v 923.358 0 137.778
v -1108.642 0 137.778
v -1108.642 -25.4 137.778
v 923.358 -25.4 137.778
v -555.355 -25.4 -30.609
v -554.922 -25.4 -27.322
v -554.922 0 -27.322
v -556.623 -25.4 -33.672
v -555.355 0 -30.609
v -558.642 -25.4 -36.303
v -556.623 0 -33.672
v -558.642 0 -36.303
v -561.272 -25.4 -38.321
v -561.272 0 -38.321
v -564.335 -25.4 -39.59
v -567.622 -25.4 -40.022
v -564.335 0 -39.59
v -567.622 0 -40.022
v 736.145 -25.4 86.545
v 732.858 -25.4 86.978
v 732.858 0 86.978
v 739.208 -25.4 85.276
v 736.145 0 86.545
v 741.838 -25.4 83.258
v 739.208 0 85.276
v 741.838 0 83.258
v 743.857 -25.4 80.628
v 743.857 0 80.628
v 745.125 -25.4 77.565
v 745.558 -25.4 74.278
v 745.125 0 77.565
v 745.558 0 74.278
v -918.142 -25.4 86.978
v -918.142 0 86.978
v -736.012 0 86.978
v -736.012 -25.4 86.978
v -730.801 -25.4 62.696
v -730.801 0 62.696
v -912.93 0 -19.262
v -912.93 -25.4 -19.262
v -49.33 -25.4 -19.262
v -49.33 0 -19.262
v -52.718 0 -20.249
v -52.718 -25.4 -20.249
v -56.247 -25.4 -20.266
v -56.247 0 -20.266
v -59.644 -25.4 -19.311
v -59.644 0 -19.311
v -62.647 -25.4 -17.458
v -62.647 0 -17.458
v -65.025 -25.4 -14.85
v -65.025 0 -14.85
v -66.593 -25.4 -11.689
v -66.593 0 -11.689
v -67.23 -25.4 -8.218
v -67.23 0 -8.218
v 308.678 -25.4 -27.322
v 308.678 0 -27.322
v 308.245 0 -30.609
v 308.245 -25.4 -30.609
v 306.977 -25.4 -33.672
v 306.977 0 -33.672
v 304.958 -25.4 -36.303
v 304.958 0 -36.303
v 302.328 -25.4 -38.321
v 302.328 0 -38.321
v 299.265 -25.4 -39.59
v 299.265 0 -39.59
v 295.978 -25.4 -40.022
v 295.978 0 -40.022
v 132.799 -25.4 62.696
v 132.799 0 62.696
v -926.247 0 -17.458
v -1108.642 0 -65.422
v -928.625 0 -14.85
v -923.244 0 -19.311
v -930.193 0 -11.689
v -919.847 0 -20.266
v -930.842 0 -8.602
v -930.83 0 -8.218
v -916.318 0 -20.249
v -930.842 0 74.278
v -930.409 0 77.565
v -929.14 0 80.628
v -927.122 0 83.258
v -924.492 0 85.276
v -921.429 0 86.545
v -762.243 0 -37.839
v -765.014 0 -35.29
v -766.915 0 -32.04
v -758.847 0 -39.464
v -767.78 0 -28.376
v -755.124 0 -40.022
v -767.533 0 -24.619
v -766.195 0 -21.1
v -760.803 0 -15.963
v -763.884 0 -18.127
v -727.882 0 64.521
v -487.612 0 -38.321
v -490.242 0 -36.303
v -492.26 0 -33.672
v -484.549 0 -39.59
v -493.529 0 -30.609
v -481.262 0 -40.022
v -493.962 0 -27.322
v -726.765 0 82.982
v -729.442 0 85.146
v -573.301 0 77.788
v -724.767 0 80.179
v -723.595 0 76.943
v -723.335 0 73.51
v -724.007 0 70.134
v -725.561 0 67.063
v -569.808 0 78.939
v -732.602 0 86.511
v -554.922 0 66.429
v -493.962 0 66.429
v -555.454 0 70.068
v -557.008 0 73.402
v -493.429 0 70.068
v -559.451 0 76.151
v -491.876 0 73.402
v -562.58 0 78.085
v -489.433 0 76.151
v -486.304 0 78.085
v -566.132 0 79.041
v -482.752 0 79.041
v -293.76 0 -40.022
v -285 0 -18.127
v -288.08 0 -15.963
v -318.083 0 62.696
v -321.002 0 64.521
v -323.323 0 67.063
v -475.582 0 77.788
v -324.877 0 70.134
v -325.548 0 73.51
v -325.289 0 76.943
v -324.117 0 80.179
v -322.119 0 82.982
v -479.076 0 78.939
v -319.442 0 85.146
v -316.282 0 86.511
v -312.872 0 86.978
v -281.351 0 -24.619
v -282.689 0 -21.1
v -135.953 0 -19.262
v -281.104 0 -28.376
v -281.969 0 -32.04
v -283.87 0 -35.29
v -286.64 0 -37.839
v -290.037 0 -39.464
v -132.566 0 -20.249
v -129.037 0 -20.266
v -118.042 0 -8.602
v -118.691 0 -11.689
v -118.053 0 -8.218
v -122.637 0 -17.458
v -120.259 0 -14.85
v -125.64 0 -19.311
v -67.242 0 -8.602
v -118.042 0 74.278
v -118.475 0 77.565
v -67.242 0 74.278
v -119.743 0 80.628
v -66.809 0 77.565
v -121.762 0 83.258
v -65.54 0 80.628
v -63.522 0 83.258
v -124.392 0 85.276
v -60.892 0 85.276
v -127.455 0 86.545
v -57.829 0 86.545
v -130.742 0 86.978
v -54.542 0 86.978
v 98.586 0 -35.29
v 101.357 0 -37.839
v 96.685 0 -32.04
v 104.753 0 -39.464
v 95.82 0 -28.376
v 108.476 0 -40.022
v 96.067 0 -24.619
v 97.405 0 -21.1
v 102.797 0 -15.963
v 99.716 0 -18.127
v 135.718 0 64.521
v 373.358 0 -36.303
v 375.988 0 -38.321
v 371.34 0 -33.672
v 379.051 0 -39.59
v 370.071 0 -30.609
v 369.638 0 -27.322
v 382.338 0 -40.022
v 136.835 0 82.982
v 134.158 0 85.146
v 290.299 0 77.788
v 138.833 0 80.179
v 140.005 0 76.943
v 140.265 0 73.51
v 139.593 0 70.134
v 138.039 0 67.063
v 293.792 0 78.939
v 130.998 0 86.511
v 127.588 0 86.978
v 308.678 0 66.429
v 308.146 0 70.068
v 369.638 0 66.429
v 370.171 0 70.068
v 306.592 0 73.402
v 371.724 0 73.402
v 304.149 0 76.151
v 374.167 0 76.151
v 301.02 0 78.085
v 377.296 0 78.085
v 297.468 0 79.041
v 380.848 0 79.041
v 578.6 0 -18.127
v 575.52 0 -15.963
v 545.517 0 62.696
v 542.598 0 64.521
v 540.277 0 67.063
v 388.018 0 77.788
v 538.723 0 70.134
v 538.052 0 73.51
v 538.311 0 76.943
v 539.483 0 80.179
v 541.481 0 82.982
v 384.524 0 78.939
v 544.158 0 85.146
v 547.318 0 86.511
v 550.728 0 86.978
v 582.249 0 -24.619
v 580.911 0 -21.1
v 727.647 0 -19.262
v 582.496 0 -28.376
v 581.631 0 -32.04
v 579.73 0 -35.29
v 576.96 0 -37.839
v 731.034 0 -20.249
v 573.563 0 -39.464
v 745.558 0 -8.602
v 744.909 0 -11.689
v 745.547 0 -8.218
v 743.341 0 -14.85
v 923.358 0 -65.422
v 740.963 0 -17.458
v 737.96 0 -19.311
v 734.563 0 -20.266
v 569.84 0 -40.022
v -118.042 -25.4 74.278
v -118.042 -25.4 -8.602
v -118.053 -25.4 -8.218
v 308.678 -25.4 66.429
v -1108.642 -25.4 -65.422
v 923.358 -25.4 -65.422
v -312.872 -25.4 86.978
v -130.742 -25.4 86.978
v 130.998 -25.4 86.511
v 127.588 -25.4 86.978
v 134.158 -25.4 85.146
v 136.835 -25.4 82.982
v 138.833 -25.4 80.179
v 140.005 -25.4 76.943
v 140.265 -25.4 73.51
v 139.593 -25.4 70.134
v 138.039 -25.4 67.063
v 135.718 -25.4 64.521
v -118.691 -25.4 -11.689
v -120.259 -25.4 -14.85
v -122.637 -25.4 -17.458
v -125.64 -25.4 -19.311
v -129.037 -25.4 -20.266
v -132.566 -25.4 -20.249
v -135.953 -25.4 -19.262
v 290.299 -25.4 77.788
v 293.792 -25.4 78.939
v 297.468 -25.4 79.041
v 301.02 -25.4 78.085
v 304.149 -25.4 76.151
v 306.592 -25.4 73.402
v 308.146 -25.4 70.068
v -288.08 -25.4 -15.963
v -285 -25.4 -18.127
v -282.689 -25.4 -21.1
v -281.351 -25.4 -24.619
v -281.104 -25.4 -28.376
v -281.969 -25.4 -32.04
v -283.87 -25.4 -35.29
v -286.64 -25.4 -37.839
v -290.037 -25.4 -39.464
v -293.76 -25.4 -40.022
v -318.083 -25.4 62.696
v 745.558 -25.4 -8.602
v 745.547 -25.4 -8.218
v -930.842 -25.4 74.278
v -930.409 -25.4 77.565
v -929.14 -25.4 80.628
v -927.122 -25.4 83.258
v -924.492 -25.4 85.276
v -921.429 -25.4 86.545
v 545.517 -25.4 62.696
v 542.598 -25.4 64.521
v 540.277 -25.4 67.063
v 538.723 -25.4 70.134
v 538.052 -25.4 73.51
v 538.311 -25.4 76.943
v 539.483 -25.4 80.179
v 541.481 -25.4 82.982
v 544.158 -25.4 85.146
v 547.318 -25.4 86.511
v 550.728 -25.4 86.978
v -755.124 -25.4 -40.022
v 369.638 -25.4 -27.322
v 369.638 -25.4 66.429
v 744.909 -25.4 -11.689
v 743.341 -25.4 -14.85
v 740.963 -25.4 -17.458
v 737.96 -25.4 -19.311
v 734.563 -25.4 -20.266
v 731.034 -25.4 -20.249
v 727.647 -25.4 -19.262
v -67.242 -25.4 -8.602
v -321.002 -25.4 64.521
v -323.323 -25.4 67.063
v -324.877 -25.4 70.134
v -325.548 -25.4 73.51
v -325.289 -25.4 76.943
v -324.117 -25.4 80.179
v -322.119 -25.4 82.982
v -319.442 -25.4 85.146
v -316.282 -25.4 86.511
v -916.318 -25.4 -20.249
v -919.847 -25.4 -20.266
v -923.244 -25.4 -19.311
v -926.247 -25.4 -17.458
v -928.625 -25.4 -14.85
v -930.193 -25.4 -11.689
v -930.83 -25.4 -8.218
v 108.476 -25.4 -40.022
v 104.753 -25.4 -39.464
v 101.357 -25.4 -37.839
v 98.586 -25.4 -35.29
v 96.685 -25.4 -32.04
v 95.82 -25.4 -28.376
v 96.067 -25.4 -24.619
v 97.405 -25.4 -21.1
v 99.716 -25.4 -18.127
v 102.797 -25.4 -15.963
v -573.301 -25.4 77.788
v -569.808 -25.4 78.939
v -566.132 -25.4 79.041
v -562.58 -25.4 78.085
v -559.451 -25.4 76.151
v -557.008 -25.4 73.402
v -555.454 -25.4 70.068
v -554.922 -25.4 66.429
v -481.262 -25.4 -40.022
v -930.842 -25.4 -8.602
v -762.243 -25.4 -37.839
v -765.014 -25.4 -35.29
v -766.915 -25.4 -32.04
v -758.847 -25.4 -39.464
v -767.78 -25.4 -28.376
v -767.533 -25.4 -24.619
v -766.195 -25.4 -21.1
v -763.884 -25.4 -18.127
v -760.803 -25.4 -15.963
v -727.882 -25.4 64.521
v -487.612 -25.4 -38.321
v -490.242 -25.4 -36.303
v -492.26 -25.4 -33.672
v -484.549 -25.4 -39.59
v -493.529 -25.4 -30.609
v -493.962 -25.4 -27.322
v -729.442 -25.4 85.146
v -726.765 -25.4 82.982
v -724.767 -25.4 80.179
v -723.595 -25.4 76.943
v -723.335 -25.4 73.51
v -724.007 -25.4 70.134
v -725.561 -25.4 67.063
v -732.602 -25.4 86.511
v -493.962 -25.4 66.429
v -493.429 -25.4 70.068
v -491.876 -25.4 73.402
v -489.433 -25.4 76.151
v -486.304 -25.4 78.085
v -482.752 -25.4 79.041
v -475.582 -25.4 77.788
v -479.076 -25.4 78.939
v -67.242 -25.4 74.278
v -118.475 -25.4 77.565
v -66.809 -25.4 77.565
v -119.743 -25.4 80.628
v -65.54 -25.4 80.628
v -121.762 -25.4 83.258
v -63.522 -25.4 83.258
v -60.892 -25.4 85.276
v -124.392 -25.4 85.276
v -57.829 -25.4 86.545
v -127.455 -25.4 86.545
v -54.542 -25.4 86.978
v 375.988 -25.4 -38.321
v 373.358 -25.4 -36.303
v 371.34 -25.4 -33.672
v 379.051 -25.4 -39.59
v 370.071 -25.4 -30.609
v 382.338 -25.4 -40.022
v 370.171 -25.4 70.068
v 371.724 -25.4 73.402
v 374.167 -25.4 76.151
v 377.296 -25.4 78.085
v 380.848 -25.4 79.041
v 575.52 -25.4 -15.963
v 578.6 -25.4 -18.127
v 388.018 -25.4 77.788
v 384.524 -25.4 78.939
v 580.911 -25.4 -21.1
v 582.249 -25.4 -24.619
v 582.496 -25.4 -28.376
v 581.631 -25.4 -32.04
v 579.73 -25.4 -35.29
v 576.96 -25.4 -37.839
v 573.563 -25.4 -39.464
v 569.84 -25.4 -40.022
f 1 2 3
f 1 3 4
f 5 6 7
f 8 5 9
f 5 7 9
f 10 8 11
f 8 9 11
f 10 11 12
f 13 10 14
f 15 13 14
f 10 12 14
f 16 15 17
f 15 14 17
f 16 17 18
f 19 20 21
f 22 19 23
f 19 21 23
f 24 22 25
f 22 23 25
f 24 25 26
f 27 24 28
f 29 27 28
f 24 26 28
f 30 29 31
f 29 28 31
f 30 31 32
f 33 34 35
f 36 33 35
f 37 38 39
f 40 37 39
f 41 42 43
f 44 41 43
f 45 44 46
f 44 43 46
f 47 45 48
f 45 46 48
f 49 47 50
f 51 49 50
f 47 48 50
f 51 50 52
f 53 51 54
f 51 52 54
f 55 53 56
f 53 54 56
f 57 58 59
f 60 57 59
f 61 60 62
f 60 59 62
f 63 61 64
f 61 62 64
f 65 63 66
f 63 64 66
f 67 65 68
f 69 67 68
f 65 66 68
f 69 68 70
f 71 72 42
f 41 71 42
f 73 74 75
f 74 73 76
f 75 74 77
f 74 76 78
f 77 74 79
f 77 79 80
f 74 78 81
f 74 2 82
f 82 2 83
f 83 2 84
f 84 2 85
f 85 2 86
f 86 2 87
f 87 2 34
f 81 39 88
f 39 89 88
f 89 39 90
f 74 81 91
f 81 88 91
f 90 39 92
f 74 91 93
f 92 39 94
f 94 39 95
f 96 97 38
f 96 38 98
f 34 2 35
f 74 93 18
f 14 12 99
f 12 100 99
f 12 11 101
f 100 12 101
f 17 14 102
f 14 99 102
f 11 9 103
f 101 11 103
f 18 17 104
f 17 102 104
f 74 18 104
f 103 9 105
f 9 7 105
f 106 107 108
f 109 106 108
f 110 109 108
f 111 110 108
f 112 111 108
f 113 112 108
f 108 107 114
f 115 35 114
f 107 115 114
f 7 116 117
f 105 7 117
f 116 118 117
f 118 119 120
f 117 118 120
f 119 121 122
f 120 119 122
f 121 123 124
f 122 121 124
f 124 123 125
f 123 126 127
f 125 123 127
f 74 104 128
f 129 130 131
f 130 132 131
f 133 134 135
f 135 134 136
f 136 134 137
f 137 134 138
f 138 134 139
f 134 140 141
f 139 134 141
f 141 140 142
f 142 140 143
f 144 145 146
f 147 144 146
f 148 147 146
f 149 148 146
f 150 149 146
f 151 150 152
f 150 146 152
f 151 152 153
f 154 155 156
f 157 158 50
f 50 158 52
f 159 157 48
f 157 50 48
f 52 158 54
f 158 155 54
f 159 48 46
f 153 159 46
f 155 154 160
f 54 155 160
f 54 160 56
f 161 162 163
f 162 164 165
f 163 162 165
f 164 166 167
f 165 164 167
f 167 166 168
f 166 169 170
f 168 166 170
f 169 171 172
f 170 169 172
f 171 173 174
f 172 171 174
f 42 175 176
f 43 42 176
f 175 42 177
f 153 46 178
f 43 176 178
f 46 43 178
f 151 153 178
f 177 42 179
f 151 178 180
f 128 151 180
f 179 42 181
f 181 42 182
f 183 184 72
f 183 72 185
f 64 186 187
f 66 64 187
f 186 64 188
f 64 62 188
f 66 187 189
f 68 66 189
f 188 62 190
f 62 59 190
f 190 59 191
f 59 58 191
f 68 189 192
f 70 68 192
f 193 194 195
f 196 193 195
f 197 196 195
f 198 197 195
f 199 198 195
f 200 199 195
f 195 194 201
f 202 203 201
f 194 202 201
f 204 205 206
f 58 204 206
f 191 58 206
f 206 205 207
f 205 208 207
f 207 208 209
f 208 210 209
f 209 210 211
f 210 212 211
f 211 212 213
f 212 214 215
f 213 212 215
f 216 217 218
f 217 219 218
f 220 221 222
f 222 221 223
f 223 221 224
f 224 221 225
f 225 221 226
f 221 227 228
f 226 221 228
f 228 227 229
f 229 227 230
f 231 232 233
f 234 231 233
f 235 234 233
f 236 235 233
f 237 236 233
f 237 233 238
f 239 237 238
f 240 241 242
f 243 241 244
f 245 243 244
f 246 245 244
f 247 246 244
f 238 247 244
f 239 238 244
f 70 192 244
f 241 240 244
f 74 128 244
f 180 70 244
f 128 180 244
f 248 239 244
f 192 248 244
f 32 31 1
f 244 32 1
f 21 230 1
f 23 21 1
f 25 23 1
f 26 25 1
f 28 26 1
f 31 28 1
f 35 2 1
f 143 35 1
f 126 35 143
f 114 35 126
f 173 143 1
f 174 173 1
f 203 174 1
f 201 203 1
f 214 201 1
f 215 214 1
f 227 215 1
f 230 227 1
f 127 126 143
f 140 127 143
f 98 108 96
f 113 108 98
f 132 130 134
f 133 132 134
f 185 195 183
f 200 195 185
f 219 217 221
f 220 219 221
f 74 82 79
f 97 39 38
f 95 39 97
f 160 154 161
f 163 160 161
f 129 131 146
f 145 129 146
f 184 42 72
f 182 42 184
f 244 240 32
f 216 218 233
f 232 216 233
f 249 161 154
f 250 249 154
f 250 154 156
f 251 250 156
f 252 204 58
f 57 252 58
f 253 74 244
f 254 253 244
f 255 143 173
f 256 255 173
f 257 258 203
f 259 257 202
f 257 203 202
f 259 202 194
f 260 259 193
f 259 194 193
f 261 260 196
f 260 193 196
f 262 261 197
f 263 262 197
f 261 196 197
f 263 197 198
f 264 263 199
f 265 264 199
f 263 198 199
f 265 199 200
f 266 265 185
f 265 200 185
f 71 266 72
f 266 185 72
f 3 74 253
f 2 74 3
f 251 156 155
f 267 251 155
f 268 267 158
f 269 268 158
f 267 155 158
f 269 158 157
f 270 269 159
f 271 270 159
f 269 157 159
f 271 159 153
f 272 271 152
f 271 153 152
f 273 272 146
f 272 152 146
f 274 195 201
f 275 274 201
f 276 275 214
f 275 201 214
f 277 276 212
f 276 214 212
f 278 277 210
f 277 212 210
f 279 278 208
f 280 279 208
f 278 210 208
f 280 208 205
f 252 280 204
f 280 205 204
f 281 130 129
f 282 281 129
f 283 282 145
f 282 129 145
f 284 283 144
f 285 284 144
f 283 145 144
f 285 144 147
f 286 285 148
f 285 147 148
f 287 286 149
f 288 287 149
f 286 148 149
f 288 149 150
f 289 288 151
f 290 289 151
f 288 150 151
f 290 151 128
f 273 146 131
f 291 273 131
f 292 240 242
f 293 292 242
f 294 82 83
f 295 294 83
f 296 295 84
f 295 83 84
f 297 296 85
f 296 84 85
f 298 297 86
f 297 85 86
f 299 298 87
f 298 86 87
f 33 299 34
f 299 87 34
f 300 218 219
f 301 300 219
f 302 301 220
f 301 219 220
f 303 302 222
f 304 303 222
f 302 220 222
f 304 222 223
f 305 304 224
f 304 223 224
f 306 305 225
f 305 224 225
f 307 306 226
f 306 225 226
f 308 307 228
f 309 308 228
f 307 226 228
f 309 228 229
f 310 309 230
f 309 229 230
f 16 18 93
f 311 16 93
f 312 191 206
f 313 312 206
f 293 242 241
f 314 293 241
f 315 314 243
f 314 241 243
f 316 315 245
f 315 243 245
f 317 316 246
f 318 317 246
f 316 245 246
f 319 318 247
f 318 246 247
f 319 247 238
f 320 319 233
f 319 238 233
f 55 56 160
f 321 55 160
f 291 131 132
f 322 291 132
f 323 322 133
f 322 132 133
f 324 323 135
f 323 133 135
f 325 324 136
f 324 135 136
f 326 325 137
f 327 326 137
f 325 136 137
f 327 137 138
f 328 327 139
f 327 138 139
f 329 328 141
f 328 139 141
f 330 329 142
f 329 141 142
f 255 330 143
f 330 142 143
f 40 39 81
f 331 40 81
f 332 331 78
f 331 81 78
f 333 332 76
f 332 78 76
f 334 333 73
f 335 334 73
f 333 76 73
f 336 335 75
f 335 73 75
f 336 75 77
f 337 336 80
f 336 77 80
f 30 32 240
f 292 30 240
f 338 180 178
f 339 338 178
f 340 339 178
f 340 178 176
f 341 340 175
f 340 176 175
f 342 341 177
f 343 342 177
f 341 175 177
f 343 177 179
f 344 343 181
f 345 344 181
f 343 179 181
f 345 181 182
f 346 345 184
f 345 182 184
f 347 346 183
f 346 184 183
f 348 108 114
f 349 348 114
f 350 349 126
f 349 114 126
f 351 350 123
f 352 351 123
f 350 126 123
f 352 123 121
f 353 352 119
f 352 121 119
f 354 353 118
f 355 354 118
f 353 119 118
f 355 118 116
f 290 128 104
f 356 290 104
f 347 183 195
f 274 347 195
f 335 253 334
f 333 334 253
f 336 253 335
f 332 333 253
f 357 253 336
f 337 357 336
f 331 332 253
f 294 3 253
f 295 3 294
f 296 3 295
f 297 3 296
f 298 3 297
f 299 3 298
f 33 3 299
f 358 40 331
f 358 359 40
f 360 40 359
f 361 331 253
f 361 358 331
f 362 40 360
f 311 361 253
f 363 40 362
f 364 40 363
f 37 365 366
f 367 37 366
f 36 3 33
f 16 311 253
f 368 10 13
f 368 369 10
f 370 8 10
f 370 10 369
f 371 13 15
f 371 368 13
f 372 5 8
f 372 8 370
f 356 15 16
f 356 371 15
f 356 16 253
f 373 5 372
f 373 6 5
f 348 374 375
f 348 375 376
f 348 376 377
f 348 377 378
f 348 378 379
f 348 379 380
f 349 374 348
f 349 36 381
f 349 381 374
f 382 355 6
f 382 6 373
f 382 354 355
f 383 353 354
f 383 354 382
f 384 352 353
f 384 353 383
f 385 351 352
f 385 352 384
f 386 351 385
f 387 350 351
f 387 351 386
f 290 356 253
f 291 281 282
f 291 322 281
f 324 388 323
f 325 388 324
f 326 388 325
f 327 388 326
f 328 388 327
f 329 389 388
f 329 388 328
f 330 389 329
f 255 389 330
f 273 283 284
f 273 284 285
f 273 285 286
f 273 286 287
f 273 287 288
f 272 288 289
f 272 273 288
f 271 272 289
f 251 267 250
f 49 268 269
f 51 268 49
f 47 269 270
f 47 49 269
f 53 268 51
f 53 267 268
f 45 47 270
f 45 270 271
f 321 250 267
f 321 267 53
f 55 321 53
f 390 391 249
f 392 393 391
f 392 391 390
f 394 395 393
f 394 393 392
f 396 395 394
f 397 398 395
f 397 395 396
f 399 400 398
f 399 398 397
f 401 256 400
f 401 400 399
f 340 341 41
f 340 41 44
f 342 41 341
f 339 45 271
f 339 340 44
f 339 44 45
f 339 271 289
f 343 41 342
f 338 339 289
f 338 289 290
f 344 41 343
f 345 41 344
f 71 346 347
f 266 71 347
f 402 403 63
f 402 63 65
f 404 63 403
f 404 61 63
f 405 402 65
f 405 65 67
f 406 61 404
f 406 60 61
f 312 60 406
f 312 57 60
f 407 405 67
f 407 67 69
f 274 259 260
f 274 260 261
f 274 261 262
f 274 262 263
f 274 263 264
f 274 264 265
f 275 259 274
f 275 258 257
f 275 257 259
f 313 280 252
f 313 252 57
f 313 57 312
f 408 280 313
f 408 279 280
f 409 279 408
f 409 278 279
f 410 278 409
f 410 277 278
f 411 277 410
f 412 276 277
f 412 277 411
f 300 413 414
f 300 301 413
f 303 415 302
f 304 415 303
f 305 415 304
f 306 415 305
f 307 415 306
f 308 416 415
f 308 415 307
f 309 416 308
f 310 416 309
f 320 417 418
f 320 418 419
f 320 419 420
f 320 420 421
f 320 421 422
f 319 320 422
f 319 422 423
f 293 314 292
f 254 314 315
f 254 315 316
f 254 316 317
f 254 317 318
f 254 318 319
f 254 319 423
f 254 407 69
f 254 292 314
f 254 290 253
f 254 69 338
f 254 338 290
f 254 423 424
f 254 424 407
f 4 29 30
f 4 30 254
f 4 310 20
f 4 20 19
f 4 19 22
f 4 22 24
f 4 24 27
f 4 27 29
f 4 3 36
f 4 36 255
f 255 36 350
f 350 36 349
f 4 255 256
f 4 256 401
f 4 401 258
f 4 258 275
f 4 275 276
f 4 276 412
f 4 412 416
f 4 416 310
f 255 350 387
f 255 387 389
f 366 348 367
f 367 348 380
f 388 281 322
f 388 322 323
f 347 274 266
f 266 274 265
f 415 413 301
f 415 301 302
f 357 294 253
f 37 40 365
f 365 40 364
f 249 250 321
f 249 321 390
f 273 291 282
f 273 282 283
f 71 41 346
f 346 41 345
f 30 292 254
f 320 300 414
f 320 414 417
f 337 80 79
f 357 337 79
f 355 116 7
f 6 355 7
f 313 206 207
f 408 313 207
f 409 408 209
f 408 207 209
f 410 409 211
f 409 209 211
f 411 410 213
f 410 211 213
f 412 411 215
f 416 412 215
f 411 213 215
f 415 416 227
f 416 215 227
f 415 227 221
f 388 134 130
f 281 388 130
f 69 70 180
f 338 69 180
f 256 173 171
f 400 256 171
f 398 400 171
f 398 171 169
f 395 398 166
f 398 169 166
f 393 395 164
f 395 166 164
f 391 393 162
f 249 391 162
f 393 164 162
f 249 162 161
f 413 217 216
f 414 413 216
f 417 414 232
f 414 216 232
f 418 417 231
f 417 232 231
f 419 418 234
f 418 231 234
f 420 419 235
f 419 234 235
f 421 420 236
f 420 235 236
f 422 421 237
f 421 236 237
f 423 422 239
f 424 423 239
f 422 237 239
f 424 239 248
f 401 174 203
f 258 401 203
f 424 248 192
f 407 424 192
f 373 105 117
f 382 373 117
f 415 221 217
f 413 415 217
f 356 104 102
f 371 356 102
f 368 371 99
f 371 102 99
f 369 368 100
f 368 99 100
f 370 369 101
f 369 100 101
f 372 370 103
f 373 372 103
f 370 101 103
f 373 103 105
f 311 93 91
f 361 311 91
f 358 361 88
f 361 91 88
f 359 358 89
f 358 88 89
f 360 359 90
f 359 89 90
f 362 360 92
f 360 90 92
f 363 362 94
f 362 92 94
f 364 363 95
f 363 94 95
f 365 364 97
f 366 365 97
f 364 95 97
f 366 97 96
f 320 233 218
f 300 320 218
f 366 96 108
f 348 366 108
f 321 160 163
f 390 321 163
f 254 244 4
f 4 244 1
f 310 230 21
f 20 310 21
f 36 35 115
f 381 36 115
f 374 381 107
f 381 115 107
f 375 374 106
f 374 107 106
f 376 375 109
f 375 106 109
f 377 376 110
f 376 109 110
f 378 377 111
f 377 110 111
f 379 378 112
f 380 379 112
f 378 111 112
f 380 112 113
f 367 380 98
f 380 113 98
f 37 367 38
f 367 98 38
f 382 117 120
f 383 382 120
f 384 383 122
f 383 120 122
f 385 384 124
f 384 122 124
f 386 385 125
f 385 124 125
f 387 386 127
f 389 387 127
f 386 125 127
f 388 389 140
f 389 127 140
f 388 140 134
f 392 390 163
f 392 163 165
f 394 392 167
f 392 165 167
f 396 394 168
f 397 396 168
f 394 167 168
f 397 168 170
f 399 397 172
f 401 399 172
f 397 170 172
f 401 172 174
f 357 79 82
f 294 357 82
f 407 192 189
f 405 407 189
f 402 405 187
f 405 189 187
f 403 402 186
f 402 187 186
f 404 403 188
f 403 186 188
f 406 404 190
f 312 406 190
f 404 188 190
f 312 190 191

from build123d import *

# Parameters (mm, degrees)
F0_W     = 2032
F0_H     = 203.2
F1_DEPTH = 25.4


with BuildPart() as f1:
    # F0 (on Front) → F1 (new body)
    with BuildSketch(Plane.XZ):
        with Locations((-92.64186, 36.177602)):
            Rectangle(F0_W, F0_H)
        with BuildLine():
            ThreePointArc((-554.92186, -27.322398), (-558.641603, -36.302654), (-567.62186, -40.022398))
            Line((-567.62186, -40.022398), (-755.123796, -40.022398))
            ThreePointArc((-755.123796, -40.022398), (-767.484058, -30.24026), (-760.803409, -15.963173))
            Line((-760.803409, -15.963173), (-573.301472, 77.787796))
            ThreePointArc((-573.301472, 77.787796), (-560.945074, 77.231836), (-554.92186, 66.42857))
            Line((-554.92186, 66.42857), (-554.92186, -27.322398))
        make_face(mode=Mode.SUBTRACT)
        with BuildLine():
            Line((-930.830474, -8.218414), (-930.84186, -8.601821))
            Line((-930.84186, -8.601821), (-930.84186, 74.277602))
            ThreePointArc((-930.84186, 74.277602), (-927.122116, 83.257858), (-918.14186, 86.977602))
            Line((-918.14186, 86.977602), (-736.012165, 86.977602))
            ThreePointArc((-736.012165, 86.977602), (-723.594962, 76.942764), (-730.800533, 62.696199))
            Line((-730.800533, 62.696199), (-912.930228, -19.262164))
            ThreePointArc((-912.930228, -19.262164), (-924.810249, -18.48921), (-930.830474, -8.218414))
        make_face(mode=Mode.SUBTRACT)
        with BuildLine():
            Line((-493.96186, -27.322398), (-493.96186, 66.42857))
            ThreePointArc((-493.96186, 66.42857), (-487.938645, 77.231836), (-475.582247, 77.787796))
            Line((-475.582247, 77.787796), (-288.08031, -15.963173))
            ThreePointArc((-288.08031, -15.963173), (-281.399661, -30.24026), (-293.759923, -40.022398))
            Line((-293.759923, -40.022398), (-481.26186, -40.022398))
            ThreePointArc((-481.26186, -40.022398), (-490.242116, -36.302654), (-493.96186, -27.322398))
        make_face(mode=Mode.SUBTRACT)
        with BuildLine():
            Line((-118.04186, 74.277602), (-118.04186, -8.601821))
            Line((-118.04186, -8.601821), (-118.053245, -8.218414))
            ThreePointArc((-118.053245, -8.218414), (-124.07347, -18.48921), (-135.953491, -19.262164))
            Line((-135.953491, -19.262164), (-318.083186, 62.696199))
            ThreePointArc((-318.083186, 62.696199), (-325.288757, 76.942764), (-312.871555, 86.977602))
            Line((-312.871555, 86.977602), (-130.74186, 86.977602))
            ThreePointArc((-130.74186, 86.977602), (-121.761603, 83.257858), (-118.04186, 74.277602))
        make_face(mode=Mode.SUBTRACT)
        with BuildLine():
            Line((-67.24186, -8.601821), (-67.24186, 74.277602))
            ThreePointArc((-67.24186, 74.277602), (-63.522116, 83.257858), (-54.54186, 86.977602))
            Line((-54.54186, 86.977602), (127.587835, 86.977602))
            ThreePointArc((127.587835, 86.977602), (140.005038, 76.942764), (132.799467, 62.696199))
            Line((132.799467, 62.696199), (-49.330228, -19.262164))
            ThreePointArc((-49.330228, -19.262164), (-61.210249, -18.48921), (-67.230474, -8.218414))
            Line((-67.230474, -8.218414), (-67.24186, -8.601821))
        make_face(mode=Mode.SUBTRACT)
        with BuildLine():
            ThreePointArc((290.298528, 77.787796), (302.654926, 77.231836), (308.67814, 66.42857))
            Line((308.67814, 66.42857), (308.67814, -27.322398))
            ThreePointArc((308.67814, -27.322398), (304.958397, -36.302654), (295.97814, -40.022398))
            Line((295.97814, -40.022398), (108.476204, -40.022398))
            ThreePointArc((108.476204, -40.022398), (96.115942, -30.24026), (102.796591, -15.963173))
            Line((102.796591, -15.963173), (290.298528, 77.787796))
        make_face(mode=Mode.SUBTRACT)
        with BuildLine():
            Line((388.017753, 77.787796), (575.51969, -15.963173))
            ThreePointArc((575.51969, -15.963173), (582.200339, -30.24026), (569.840077, -40.022398))
            Line((569.840077, -40.022398), (382.33814, -40.022398))
            ThreePointArc((382.33814, -40.022398), (373.357884, -36.302654), (369.63814, -27.322398))
            Line((369.63814, -27.322398), (369.63814, 66.42857))
            ThreePointArc((369.63814, 66.42857), (375.661355, 77.231836), (388.017753, 77.787796))
        make_face(mode=Mode.SUBTRACT)
        with BuildLine():
            Line((550.728445, 86.977602), (732.85814, 86.977602))
            ThreePointArc((732.85814, 86.977602), (741.838397, 83.257858), (745.55814, 74.277602))
            Line((745.55814, 74.277602), (745.55814, -8.601821))
            Line((745.55814, -8.601821), (745.546755, -8.218414))
            ThreePointArc((745.546755, -8.218414), (739.52653, -18.48921), (727.646509, -19.262164))
            Line((727.646509, -19.262164), (545.516814, 62.696199))
            ThreePointArc((545.516814, 62.696199), (538.311243, 76.942764), (550.728445, 86.977602))
        make_face(mode=Mode.SUBTRACT)
    extrude(amount=F1_DEPTH)


solid = f1.part
